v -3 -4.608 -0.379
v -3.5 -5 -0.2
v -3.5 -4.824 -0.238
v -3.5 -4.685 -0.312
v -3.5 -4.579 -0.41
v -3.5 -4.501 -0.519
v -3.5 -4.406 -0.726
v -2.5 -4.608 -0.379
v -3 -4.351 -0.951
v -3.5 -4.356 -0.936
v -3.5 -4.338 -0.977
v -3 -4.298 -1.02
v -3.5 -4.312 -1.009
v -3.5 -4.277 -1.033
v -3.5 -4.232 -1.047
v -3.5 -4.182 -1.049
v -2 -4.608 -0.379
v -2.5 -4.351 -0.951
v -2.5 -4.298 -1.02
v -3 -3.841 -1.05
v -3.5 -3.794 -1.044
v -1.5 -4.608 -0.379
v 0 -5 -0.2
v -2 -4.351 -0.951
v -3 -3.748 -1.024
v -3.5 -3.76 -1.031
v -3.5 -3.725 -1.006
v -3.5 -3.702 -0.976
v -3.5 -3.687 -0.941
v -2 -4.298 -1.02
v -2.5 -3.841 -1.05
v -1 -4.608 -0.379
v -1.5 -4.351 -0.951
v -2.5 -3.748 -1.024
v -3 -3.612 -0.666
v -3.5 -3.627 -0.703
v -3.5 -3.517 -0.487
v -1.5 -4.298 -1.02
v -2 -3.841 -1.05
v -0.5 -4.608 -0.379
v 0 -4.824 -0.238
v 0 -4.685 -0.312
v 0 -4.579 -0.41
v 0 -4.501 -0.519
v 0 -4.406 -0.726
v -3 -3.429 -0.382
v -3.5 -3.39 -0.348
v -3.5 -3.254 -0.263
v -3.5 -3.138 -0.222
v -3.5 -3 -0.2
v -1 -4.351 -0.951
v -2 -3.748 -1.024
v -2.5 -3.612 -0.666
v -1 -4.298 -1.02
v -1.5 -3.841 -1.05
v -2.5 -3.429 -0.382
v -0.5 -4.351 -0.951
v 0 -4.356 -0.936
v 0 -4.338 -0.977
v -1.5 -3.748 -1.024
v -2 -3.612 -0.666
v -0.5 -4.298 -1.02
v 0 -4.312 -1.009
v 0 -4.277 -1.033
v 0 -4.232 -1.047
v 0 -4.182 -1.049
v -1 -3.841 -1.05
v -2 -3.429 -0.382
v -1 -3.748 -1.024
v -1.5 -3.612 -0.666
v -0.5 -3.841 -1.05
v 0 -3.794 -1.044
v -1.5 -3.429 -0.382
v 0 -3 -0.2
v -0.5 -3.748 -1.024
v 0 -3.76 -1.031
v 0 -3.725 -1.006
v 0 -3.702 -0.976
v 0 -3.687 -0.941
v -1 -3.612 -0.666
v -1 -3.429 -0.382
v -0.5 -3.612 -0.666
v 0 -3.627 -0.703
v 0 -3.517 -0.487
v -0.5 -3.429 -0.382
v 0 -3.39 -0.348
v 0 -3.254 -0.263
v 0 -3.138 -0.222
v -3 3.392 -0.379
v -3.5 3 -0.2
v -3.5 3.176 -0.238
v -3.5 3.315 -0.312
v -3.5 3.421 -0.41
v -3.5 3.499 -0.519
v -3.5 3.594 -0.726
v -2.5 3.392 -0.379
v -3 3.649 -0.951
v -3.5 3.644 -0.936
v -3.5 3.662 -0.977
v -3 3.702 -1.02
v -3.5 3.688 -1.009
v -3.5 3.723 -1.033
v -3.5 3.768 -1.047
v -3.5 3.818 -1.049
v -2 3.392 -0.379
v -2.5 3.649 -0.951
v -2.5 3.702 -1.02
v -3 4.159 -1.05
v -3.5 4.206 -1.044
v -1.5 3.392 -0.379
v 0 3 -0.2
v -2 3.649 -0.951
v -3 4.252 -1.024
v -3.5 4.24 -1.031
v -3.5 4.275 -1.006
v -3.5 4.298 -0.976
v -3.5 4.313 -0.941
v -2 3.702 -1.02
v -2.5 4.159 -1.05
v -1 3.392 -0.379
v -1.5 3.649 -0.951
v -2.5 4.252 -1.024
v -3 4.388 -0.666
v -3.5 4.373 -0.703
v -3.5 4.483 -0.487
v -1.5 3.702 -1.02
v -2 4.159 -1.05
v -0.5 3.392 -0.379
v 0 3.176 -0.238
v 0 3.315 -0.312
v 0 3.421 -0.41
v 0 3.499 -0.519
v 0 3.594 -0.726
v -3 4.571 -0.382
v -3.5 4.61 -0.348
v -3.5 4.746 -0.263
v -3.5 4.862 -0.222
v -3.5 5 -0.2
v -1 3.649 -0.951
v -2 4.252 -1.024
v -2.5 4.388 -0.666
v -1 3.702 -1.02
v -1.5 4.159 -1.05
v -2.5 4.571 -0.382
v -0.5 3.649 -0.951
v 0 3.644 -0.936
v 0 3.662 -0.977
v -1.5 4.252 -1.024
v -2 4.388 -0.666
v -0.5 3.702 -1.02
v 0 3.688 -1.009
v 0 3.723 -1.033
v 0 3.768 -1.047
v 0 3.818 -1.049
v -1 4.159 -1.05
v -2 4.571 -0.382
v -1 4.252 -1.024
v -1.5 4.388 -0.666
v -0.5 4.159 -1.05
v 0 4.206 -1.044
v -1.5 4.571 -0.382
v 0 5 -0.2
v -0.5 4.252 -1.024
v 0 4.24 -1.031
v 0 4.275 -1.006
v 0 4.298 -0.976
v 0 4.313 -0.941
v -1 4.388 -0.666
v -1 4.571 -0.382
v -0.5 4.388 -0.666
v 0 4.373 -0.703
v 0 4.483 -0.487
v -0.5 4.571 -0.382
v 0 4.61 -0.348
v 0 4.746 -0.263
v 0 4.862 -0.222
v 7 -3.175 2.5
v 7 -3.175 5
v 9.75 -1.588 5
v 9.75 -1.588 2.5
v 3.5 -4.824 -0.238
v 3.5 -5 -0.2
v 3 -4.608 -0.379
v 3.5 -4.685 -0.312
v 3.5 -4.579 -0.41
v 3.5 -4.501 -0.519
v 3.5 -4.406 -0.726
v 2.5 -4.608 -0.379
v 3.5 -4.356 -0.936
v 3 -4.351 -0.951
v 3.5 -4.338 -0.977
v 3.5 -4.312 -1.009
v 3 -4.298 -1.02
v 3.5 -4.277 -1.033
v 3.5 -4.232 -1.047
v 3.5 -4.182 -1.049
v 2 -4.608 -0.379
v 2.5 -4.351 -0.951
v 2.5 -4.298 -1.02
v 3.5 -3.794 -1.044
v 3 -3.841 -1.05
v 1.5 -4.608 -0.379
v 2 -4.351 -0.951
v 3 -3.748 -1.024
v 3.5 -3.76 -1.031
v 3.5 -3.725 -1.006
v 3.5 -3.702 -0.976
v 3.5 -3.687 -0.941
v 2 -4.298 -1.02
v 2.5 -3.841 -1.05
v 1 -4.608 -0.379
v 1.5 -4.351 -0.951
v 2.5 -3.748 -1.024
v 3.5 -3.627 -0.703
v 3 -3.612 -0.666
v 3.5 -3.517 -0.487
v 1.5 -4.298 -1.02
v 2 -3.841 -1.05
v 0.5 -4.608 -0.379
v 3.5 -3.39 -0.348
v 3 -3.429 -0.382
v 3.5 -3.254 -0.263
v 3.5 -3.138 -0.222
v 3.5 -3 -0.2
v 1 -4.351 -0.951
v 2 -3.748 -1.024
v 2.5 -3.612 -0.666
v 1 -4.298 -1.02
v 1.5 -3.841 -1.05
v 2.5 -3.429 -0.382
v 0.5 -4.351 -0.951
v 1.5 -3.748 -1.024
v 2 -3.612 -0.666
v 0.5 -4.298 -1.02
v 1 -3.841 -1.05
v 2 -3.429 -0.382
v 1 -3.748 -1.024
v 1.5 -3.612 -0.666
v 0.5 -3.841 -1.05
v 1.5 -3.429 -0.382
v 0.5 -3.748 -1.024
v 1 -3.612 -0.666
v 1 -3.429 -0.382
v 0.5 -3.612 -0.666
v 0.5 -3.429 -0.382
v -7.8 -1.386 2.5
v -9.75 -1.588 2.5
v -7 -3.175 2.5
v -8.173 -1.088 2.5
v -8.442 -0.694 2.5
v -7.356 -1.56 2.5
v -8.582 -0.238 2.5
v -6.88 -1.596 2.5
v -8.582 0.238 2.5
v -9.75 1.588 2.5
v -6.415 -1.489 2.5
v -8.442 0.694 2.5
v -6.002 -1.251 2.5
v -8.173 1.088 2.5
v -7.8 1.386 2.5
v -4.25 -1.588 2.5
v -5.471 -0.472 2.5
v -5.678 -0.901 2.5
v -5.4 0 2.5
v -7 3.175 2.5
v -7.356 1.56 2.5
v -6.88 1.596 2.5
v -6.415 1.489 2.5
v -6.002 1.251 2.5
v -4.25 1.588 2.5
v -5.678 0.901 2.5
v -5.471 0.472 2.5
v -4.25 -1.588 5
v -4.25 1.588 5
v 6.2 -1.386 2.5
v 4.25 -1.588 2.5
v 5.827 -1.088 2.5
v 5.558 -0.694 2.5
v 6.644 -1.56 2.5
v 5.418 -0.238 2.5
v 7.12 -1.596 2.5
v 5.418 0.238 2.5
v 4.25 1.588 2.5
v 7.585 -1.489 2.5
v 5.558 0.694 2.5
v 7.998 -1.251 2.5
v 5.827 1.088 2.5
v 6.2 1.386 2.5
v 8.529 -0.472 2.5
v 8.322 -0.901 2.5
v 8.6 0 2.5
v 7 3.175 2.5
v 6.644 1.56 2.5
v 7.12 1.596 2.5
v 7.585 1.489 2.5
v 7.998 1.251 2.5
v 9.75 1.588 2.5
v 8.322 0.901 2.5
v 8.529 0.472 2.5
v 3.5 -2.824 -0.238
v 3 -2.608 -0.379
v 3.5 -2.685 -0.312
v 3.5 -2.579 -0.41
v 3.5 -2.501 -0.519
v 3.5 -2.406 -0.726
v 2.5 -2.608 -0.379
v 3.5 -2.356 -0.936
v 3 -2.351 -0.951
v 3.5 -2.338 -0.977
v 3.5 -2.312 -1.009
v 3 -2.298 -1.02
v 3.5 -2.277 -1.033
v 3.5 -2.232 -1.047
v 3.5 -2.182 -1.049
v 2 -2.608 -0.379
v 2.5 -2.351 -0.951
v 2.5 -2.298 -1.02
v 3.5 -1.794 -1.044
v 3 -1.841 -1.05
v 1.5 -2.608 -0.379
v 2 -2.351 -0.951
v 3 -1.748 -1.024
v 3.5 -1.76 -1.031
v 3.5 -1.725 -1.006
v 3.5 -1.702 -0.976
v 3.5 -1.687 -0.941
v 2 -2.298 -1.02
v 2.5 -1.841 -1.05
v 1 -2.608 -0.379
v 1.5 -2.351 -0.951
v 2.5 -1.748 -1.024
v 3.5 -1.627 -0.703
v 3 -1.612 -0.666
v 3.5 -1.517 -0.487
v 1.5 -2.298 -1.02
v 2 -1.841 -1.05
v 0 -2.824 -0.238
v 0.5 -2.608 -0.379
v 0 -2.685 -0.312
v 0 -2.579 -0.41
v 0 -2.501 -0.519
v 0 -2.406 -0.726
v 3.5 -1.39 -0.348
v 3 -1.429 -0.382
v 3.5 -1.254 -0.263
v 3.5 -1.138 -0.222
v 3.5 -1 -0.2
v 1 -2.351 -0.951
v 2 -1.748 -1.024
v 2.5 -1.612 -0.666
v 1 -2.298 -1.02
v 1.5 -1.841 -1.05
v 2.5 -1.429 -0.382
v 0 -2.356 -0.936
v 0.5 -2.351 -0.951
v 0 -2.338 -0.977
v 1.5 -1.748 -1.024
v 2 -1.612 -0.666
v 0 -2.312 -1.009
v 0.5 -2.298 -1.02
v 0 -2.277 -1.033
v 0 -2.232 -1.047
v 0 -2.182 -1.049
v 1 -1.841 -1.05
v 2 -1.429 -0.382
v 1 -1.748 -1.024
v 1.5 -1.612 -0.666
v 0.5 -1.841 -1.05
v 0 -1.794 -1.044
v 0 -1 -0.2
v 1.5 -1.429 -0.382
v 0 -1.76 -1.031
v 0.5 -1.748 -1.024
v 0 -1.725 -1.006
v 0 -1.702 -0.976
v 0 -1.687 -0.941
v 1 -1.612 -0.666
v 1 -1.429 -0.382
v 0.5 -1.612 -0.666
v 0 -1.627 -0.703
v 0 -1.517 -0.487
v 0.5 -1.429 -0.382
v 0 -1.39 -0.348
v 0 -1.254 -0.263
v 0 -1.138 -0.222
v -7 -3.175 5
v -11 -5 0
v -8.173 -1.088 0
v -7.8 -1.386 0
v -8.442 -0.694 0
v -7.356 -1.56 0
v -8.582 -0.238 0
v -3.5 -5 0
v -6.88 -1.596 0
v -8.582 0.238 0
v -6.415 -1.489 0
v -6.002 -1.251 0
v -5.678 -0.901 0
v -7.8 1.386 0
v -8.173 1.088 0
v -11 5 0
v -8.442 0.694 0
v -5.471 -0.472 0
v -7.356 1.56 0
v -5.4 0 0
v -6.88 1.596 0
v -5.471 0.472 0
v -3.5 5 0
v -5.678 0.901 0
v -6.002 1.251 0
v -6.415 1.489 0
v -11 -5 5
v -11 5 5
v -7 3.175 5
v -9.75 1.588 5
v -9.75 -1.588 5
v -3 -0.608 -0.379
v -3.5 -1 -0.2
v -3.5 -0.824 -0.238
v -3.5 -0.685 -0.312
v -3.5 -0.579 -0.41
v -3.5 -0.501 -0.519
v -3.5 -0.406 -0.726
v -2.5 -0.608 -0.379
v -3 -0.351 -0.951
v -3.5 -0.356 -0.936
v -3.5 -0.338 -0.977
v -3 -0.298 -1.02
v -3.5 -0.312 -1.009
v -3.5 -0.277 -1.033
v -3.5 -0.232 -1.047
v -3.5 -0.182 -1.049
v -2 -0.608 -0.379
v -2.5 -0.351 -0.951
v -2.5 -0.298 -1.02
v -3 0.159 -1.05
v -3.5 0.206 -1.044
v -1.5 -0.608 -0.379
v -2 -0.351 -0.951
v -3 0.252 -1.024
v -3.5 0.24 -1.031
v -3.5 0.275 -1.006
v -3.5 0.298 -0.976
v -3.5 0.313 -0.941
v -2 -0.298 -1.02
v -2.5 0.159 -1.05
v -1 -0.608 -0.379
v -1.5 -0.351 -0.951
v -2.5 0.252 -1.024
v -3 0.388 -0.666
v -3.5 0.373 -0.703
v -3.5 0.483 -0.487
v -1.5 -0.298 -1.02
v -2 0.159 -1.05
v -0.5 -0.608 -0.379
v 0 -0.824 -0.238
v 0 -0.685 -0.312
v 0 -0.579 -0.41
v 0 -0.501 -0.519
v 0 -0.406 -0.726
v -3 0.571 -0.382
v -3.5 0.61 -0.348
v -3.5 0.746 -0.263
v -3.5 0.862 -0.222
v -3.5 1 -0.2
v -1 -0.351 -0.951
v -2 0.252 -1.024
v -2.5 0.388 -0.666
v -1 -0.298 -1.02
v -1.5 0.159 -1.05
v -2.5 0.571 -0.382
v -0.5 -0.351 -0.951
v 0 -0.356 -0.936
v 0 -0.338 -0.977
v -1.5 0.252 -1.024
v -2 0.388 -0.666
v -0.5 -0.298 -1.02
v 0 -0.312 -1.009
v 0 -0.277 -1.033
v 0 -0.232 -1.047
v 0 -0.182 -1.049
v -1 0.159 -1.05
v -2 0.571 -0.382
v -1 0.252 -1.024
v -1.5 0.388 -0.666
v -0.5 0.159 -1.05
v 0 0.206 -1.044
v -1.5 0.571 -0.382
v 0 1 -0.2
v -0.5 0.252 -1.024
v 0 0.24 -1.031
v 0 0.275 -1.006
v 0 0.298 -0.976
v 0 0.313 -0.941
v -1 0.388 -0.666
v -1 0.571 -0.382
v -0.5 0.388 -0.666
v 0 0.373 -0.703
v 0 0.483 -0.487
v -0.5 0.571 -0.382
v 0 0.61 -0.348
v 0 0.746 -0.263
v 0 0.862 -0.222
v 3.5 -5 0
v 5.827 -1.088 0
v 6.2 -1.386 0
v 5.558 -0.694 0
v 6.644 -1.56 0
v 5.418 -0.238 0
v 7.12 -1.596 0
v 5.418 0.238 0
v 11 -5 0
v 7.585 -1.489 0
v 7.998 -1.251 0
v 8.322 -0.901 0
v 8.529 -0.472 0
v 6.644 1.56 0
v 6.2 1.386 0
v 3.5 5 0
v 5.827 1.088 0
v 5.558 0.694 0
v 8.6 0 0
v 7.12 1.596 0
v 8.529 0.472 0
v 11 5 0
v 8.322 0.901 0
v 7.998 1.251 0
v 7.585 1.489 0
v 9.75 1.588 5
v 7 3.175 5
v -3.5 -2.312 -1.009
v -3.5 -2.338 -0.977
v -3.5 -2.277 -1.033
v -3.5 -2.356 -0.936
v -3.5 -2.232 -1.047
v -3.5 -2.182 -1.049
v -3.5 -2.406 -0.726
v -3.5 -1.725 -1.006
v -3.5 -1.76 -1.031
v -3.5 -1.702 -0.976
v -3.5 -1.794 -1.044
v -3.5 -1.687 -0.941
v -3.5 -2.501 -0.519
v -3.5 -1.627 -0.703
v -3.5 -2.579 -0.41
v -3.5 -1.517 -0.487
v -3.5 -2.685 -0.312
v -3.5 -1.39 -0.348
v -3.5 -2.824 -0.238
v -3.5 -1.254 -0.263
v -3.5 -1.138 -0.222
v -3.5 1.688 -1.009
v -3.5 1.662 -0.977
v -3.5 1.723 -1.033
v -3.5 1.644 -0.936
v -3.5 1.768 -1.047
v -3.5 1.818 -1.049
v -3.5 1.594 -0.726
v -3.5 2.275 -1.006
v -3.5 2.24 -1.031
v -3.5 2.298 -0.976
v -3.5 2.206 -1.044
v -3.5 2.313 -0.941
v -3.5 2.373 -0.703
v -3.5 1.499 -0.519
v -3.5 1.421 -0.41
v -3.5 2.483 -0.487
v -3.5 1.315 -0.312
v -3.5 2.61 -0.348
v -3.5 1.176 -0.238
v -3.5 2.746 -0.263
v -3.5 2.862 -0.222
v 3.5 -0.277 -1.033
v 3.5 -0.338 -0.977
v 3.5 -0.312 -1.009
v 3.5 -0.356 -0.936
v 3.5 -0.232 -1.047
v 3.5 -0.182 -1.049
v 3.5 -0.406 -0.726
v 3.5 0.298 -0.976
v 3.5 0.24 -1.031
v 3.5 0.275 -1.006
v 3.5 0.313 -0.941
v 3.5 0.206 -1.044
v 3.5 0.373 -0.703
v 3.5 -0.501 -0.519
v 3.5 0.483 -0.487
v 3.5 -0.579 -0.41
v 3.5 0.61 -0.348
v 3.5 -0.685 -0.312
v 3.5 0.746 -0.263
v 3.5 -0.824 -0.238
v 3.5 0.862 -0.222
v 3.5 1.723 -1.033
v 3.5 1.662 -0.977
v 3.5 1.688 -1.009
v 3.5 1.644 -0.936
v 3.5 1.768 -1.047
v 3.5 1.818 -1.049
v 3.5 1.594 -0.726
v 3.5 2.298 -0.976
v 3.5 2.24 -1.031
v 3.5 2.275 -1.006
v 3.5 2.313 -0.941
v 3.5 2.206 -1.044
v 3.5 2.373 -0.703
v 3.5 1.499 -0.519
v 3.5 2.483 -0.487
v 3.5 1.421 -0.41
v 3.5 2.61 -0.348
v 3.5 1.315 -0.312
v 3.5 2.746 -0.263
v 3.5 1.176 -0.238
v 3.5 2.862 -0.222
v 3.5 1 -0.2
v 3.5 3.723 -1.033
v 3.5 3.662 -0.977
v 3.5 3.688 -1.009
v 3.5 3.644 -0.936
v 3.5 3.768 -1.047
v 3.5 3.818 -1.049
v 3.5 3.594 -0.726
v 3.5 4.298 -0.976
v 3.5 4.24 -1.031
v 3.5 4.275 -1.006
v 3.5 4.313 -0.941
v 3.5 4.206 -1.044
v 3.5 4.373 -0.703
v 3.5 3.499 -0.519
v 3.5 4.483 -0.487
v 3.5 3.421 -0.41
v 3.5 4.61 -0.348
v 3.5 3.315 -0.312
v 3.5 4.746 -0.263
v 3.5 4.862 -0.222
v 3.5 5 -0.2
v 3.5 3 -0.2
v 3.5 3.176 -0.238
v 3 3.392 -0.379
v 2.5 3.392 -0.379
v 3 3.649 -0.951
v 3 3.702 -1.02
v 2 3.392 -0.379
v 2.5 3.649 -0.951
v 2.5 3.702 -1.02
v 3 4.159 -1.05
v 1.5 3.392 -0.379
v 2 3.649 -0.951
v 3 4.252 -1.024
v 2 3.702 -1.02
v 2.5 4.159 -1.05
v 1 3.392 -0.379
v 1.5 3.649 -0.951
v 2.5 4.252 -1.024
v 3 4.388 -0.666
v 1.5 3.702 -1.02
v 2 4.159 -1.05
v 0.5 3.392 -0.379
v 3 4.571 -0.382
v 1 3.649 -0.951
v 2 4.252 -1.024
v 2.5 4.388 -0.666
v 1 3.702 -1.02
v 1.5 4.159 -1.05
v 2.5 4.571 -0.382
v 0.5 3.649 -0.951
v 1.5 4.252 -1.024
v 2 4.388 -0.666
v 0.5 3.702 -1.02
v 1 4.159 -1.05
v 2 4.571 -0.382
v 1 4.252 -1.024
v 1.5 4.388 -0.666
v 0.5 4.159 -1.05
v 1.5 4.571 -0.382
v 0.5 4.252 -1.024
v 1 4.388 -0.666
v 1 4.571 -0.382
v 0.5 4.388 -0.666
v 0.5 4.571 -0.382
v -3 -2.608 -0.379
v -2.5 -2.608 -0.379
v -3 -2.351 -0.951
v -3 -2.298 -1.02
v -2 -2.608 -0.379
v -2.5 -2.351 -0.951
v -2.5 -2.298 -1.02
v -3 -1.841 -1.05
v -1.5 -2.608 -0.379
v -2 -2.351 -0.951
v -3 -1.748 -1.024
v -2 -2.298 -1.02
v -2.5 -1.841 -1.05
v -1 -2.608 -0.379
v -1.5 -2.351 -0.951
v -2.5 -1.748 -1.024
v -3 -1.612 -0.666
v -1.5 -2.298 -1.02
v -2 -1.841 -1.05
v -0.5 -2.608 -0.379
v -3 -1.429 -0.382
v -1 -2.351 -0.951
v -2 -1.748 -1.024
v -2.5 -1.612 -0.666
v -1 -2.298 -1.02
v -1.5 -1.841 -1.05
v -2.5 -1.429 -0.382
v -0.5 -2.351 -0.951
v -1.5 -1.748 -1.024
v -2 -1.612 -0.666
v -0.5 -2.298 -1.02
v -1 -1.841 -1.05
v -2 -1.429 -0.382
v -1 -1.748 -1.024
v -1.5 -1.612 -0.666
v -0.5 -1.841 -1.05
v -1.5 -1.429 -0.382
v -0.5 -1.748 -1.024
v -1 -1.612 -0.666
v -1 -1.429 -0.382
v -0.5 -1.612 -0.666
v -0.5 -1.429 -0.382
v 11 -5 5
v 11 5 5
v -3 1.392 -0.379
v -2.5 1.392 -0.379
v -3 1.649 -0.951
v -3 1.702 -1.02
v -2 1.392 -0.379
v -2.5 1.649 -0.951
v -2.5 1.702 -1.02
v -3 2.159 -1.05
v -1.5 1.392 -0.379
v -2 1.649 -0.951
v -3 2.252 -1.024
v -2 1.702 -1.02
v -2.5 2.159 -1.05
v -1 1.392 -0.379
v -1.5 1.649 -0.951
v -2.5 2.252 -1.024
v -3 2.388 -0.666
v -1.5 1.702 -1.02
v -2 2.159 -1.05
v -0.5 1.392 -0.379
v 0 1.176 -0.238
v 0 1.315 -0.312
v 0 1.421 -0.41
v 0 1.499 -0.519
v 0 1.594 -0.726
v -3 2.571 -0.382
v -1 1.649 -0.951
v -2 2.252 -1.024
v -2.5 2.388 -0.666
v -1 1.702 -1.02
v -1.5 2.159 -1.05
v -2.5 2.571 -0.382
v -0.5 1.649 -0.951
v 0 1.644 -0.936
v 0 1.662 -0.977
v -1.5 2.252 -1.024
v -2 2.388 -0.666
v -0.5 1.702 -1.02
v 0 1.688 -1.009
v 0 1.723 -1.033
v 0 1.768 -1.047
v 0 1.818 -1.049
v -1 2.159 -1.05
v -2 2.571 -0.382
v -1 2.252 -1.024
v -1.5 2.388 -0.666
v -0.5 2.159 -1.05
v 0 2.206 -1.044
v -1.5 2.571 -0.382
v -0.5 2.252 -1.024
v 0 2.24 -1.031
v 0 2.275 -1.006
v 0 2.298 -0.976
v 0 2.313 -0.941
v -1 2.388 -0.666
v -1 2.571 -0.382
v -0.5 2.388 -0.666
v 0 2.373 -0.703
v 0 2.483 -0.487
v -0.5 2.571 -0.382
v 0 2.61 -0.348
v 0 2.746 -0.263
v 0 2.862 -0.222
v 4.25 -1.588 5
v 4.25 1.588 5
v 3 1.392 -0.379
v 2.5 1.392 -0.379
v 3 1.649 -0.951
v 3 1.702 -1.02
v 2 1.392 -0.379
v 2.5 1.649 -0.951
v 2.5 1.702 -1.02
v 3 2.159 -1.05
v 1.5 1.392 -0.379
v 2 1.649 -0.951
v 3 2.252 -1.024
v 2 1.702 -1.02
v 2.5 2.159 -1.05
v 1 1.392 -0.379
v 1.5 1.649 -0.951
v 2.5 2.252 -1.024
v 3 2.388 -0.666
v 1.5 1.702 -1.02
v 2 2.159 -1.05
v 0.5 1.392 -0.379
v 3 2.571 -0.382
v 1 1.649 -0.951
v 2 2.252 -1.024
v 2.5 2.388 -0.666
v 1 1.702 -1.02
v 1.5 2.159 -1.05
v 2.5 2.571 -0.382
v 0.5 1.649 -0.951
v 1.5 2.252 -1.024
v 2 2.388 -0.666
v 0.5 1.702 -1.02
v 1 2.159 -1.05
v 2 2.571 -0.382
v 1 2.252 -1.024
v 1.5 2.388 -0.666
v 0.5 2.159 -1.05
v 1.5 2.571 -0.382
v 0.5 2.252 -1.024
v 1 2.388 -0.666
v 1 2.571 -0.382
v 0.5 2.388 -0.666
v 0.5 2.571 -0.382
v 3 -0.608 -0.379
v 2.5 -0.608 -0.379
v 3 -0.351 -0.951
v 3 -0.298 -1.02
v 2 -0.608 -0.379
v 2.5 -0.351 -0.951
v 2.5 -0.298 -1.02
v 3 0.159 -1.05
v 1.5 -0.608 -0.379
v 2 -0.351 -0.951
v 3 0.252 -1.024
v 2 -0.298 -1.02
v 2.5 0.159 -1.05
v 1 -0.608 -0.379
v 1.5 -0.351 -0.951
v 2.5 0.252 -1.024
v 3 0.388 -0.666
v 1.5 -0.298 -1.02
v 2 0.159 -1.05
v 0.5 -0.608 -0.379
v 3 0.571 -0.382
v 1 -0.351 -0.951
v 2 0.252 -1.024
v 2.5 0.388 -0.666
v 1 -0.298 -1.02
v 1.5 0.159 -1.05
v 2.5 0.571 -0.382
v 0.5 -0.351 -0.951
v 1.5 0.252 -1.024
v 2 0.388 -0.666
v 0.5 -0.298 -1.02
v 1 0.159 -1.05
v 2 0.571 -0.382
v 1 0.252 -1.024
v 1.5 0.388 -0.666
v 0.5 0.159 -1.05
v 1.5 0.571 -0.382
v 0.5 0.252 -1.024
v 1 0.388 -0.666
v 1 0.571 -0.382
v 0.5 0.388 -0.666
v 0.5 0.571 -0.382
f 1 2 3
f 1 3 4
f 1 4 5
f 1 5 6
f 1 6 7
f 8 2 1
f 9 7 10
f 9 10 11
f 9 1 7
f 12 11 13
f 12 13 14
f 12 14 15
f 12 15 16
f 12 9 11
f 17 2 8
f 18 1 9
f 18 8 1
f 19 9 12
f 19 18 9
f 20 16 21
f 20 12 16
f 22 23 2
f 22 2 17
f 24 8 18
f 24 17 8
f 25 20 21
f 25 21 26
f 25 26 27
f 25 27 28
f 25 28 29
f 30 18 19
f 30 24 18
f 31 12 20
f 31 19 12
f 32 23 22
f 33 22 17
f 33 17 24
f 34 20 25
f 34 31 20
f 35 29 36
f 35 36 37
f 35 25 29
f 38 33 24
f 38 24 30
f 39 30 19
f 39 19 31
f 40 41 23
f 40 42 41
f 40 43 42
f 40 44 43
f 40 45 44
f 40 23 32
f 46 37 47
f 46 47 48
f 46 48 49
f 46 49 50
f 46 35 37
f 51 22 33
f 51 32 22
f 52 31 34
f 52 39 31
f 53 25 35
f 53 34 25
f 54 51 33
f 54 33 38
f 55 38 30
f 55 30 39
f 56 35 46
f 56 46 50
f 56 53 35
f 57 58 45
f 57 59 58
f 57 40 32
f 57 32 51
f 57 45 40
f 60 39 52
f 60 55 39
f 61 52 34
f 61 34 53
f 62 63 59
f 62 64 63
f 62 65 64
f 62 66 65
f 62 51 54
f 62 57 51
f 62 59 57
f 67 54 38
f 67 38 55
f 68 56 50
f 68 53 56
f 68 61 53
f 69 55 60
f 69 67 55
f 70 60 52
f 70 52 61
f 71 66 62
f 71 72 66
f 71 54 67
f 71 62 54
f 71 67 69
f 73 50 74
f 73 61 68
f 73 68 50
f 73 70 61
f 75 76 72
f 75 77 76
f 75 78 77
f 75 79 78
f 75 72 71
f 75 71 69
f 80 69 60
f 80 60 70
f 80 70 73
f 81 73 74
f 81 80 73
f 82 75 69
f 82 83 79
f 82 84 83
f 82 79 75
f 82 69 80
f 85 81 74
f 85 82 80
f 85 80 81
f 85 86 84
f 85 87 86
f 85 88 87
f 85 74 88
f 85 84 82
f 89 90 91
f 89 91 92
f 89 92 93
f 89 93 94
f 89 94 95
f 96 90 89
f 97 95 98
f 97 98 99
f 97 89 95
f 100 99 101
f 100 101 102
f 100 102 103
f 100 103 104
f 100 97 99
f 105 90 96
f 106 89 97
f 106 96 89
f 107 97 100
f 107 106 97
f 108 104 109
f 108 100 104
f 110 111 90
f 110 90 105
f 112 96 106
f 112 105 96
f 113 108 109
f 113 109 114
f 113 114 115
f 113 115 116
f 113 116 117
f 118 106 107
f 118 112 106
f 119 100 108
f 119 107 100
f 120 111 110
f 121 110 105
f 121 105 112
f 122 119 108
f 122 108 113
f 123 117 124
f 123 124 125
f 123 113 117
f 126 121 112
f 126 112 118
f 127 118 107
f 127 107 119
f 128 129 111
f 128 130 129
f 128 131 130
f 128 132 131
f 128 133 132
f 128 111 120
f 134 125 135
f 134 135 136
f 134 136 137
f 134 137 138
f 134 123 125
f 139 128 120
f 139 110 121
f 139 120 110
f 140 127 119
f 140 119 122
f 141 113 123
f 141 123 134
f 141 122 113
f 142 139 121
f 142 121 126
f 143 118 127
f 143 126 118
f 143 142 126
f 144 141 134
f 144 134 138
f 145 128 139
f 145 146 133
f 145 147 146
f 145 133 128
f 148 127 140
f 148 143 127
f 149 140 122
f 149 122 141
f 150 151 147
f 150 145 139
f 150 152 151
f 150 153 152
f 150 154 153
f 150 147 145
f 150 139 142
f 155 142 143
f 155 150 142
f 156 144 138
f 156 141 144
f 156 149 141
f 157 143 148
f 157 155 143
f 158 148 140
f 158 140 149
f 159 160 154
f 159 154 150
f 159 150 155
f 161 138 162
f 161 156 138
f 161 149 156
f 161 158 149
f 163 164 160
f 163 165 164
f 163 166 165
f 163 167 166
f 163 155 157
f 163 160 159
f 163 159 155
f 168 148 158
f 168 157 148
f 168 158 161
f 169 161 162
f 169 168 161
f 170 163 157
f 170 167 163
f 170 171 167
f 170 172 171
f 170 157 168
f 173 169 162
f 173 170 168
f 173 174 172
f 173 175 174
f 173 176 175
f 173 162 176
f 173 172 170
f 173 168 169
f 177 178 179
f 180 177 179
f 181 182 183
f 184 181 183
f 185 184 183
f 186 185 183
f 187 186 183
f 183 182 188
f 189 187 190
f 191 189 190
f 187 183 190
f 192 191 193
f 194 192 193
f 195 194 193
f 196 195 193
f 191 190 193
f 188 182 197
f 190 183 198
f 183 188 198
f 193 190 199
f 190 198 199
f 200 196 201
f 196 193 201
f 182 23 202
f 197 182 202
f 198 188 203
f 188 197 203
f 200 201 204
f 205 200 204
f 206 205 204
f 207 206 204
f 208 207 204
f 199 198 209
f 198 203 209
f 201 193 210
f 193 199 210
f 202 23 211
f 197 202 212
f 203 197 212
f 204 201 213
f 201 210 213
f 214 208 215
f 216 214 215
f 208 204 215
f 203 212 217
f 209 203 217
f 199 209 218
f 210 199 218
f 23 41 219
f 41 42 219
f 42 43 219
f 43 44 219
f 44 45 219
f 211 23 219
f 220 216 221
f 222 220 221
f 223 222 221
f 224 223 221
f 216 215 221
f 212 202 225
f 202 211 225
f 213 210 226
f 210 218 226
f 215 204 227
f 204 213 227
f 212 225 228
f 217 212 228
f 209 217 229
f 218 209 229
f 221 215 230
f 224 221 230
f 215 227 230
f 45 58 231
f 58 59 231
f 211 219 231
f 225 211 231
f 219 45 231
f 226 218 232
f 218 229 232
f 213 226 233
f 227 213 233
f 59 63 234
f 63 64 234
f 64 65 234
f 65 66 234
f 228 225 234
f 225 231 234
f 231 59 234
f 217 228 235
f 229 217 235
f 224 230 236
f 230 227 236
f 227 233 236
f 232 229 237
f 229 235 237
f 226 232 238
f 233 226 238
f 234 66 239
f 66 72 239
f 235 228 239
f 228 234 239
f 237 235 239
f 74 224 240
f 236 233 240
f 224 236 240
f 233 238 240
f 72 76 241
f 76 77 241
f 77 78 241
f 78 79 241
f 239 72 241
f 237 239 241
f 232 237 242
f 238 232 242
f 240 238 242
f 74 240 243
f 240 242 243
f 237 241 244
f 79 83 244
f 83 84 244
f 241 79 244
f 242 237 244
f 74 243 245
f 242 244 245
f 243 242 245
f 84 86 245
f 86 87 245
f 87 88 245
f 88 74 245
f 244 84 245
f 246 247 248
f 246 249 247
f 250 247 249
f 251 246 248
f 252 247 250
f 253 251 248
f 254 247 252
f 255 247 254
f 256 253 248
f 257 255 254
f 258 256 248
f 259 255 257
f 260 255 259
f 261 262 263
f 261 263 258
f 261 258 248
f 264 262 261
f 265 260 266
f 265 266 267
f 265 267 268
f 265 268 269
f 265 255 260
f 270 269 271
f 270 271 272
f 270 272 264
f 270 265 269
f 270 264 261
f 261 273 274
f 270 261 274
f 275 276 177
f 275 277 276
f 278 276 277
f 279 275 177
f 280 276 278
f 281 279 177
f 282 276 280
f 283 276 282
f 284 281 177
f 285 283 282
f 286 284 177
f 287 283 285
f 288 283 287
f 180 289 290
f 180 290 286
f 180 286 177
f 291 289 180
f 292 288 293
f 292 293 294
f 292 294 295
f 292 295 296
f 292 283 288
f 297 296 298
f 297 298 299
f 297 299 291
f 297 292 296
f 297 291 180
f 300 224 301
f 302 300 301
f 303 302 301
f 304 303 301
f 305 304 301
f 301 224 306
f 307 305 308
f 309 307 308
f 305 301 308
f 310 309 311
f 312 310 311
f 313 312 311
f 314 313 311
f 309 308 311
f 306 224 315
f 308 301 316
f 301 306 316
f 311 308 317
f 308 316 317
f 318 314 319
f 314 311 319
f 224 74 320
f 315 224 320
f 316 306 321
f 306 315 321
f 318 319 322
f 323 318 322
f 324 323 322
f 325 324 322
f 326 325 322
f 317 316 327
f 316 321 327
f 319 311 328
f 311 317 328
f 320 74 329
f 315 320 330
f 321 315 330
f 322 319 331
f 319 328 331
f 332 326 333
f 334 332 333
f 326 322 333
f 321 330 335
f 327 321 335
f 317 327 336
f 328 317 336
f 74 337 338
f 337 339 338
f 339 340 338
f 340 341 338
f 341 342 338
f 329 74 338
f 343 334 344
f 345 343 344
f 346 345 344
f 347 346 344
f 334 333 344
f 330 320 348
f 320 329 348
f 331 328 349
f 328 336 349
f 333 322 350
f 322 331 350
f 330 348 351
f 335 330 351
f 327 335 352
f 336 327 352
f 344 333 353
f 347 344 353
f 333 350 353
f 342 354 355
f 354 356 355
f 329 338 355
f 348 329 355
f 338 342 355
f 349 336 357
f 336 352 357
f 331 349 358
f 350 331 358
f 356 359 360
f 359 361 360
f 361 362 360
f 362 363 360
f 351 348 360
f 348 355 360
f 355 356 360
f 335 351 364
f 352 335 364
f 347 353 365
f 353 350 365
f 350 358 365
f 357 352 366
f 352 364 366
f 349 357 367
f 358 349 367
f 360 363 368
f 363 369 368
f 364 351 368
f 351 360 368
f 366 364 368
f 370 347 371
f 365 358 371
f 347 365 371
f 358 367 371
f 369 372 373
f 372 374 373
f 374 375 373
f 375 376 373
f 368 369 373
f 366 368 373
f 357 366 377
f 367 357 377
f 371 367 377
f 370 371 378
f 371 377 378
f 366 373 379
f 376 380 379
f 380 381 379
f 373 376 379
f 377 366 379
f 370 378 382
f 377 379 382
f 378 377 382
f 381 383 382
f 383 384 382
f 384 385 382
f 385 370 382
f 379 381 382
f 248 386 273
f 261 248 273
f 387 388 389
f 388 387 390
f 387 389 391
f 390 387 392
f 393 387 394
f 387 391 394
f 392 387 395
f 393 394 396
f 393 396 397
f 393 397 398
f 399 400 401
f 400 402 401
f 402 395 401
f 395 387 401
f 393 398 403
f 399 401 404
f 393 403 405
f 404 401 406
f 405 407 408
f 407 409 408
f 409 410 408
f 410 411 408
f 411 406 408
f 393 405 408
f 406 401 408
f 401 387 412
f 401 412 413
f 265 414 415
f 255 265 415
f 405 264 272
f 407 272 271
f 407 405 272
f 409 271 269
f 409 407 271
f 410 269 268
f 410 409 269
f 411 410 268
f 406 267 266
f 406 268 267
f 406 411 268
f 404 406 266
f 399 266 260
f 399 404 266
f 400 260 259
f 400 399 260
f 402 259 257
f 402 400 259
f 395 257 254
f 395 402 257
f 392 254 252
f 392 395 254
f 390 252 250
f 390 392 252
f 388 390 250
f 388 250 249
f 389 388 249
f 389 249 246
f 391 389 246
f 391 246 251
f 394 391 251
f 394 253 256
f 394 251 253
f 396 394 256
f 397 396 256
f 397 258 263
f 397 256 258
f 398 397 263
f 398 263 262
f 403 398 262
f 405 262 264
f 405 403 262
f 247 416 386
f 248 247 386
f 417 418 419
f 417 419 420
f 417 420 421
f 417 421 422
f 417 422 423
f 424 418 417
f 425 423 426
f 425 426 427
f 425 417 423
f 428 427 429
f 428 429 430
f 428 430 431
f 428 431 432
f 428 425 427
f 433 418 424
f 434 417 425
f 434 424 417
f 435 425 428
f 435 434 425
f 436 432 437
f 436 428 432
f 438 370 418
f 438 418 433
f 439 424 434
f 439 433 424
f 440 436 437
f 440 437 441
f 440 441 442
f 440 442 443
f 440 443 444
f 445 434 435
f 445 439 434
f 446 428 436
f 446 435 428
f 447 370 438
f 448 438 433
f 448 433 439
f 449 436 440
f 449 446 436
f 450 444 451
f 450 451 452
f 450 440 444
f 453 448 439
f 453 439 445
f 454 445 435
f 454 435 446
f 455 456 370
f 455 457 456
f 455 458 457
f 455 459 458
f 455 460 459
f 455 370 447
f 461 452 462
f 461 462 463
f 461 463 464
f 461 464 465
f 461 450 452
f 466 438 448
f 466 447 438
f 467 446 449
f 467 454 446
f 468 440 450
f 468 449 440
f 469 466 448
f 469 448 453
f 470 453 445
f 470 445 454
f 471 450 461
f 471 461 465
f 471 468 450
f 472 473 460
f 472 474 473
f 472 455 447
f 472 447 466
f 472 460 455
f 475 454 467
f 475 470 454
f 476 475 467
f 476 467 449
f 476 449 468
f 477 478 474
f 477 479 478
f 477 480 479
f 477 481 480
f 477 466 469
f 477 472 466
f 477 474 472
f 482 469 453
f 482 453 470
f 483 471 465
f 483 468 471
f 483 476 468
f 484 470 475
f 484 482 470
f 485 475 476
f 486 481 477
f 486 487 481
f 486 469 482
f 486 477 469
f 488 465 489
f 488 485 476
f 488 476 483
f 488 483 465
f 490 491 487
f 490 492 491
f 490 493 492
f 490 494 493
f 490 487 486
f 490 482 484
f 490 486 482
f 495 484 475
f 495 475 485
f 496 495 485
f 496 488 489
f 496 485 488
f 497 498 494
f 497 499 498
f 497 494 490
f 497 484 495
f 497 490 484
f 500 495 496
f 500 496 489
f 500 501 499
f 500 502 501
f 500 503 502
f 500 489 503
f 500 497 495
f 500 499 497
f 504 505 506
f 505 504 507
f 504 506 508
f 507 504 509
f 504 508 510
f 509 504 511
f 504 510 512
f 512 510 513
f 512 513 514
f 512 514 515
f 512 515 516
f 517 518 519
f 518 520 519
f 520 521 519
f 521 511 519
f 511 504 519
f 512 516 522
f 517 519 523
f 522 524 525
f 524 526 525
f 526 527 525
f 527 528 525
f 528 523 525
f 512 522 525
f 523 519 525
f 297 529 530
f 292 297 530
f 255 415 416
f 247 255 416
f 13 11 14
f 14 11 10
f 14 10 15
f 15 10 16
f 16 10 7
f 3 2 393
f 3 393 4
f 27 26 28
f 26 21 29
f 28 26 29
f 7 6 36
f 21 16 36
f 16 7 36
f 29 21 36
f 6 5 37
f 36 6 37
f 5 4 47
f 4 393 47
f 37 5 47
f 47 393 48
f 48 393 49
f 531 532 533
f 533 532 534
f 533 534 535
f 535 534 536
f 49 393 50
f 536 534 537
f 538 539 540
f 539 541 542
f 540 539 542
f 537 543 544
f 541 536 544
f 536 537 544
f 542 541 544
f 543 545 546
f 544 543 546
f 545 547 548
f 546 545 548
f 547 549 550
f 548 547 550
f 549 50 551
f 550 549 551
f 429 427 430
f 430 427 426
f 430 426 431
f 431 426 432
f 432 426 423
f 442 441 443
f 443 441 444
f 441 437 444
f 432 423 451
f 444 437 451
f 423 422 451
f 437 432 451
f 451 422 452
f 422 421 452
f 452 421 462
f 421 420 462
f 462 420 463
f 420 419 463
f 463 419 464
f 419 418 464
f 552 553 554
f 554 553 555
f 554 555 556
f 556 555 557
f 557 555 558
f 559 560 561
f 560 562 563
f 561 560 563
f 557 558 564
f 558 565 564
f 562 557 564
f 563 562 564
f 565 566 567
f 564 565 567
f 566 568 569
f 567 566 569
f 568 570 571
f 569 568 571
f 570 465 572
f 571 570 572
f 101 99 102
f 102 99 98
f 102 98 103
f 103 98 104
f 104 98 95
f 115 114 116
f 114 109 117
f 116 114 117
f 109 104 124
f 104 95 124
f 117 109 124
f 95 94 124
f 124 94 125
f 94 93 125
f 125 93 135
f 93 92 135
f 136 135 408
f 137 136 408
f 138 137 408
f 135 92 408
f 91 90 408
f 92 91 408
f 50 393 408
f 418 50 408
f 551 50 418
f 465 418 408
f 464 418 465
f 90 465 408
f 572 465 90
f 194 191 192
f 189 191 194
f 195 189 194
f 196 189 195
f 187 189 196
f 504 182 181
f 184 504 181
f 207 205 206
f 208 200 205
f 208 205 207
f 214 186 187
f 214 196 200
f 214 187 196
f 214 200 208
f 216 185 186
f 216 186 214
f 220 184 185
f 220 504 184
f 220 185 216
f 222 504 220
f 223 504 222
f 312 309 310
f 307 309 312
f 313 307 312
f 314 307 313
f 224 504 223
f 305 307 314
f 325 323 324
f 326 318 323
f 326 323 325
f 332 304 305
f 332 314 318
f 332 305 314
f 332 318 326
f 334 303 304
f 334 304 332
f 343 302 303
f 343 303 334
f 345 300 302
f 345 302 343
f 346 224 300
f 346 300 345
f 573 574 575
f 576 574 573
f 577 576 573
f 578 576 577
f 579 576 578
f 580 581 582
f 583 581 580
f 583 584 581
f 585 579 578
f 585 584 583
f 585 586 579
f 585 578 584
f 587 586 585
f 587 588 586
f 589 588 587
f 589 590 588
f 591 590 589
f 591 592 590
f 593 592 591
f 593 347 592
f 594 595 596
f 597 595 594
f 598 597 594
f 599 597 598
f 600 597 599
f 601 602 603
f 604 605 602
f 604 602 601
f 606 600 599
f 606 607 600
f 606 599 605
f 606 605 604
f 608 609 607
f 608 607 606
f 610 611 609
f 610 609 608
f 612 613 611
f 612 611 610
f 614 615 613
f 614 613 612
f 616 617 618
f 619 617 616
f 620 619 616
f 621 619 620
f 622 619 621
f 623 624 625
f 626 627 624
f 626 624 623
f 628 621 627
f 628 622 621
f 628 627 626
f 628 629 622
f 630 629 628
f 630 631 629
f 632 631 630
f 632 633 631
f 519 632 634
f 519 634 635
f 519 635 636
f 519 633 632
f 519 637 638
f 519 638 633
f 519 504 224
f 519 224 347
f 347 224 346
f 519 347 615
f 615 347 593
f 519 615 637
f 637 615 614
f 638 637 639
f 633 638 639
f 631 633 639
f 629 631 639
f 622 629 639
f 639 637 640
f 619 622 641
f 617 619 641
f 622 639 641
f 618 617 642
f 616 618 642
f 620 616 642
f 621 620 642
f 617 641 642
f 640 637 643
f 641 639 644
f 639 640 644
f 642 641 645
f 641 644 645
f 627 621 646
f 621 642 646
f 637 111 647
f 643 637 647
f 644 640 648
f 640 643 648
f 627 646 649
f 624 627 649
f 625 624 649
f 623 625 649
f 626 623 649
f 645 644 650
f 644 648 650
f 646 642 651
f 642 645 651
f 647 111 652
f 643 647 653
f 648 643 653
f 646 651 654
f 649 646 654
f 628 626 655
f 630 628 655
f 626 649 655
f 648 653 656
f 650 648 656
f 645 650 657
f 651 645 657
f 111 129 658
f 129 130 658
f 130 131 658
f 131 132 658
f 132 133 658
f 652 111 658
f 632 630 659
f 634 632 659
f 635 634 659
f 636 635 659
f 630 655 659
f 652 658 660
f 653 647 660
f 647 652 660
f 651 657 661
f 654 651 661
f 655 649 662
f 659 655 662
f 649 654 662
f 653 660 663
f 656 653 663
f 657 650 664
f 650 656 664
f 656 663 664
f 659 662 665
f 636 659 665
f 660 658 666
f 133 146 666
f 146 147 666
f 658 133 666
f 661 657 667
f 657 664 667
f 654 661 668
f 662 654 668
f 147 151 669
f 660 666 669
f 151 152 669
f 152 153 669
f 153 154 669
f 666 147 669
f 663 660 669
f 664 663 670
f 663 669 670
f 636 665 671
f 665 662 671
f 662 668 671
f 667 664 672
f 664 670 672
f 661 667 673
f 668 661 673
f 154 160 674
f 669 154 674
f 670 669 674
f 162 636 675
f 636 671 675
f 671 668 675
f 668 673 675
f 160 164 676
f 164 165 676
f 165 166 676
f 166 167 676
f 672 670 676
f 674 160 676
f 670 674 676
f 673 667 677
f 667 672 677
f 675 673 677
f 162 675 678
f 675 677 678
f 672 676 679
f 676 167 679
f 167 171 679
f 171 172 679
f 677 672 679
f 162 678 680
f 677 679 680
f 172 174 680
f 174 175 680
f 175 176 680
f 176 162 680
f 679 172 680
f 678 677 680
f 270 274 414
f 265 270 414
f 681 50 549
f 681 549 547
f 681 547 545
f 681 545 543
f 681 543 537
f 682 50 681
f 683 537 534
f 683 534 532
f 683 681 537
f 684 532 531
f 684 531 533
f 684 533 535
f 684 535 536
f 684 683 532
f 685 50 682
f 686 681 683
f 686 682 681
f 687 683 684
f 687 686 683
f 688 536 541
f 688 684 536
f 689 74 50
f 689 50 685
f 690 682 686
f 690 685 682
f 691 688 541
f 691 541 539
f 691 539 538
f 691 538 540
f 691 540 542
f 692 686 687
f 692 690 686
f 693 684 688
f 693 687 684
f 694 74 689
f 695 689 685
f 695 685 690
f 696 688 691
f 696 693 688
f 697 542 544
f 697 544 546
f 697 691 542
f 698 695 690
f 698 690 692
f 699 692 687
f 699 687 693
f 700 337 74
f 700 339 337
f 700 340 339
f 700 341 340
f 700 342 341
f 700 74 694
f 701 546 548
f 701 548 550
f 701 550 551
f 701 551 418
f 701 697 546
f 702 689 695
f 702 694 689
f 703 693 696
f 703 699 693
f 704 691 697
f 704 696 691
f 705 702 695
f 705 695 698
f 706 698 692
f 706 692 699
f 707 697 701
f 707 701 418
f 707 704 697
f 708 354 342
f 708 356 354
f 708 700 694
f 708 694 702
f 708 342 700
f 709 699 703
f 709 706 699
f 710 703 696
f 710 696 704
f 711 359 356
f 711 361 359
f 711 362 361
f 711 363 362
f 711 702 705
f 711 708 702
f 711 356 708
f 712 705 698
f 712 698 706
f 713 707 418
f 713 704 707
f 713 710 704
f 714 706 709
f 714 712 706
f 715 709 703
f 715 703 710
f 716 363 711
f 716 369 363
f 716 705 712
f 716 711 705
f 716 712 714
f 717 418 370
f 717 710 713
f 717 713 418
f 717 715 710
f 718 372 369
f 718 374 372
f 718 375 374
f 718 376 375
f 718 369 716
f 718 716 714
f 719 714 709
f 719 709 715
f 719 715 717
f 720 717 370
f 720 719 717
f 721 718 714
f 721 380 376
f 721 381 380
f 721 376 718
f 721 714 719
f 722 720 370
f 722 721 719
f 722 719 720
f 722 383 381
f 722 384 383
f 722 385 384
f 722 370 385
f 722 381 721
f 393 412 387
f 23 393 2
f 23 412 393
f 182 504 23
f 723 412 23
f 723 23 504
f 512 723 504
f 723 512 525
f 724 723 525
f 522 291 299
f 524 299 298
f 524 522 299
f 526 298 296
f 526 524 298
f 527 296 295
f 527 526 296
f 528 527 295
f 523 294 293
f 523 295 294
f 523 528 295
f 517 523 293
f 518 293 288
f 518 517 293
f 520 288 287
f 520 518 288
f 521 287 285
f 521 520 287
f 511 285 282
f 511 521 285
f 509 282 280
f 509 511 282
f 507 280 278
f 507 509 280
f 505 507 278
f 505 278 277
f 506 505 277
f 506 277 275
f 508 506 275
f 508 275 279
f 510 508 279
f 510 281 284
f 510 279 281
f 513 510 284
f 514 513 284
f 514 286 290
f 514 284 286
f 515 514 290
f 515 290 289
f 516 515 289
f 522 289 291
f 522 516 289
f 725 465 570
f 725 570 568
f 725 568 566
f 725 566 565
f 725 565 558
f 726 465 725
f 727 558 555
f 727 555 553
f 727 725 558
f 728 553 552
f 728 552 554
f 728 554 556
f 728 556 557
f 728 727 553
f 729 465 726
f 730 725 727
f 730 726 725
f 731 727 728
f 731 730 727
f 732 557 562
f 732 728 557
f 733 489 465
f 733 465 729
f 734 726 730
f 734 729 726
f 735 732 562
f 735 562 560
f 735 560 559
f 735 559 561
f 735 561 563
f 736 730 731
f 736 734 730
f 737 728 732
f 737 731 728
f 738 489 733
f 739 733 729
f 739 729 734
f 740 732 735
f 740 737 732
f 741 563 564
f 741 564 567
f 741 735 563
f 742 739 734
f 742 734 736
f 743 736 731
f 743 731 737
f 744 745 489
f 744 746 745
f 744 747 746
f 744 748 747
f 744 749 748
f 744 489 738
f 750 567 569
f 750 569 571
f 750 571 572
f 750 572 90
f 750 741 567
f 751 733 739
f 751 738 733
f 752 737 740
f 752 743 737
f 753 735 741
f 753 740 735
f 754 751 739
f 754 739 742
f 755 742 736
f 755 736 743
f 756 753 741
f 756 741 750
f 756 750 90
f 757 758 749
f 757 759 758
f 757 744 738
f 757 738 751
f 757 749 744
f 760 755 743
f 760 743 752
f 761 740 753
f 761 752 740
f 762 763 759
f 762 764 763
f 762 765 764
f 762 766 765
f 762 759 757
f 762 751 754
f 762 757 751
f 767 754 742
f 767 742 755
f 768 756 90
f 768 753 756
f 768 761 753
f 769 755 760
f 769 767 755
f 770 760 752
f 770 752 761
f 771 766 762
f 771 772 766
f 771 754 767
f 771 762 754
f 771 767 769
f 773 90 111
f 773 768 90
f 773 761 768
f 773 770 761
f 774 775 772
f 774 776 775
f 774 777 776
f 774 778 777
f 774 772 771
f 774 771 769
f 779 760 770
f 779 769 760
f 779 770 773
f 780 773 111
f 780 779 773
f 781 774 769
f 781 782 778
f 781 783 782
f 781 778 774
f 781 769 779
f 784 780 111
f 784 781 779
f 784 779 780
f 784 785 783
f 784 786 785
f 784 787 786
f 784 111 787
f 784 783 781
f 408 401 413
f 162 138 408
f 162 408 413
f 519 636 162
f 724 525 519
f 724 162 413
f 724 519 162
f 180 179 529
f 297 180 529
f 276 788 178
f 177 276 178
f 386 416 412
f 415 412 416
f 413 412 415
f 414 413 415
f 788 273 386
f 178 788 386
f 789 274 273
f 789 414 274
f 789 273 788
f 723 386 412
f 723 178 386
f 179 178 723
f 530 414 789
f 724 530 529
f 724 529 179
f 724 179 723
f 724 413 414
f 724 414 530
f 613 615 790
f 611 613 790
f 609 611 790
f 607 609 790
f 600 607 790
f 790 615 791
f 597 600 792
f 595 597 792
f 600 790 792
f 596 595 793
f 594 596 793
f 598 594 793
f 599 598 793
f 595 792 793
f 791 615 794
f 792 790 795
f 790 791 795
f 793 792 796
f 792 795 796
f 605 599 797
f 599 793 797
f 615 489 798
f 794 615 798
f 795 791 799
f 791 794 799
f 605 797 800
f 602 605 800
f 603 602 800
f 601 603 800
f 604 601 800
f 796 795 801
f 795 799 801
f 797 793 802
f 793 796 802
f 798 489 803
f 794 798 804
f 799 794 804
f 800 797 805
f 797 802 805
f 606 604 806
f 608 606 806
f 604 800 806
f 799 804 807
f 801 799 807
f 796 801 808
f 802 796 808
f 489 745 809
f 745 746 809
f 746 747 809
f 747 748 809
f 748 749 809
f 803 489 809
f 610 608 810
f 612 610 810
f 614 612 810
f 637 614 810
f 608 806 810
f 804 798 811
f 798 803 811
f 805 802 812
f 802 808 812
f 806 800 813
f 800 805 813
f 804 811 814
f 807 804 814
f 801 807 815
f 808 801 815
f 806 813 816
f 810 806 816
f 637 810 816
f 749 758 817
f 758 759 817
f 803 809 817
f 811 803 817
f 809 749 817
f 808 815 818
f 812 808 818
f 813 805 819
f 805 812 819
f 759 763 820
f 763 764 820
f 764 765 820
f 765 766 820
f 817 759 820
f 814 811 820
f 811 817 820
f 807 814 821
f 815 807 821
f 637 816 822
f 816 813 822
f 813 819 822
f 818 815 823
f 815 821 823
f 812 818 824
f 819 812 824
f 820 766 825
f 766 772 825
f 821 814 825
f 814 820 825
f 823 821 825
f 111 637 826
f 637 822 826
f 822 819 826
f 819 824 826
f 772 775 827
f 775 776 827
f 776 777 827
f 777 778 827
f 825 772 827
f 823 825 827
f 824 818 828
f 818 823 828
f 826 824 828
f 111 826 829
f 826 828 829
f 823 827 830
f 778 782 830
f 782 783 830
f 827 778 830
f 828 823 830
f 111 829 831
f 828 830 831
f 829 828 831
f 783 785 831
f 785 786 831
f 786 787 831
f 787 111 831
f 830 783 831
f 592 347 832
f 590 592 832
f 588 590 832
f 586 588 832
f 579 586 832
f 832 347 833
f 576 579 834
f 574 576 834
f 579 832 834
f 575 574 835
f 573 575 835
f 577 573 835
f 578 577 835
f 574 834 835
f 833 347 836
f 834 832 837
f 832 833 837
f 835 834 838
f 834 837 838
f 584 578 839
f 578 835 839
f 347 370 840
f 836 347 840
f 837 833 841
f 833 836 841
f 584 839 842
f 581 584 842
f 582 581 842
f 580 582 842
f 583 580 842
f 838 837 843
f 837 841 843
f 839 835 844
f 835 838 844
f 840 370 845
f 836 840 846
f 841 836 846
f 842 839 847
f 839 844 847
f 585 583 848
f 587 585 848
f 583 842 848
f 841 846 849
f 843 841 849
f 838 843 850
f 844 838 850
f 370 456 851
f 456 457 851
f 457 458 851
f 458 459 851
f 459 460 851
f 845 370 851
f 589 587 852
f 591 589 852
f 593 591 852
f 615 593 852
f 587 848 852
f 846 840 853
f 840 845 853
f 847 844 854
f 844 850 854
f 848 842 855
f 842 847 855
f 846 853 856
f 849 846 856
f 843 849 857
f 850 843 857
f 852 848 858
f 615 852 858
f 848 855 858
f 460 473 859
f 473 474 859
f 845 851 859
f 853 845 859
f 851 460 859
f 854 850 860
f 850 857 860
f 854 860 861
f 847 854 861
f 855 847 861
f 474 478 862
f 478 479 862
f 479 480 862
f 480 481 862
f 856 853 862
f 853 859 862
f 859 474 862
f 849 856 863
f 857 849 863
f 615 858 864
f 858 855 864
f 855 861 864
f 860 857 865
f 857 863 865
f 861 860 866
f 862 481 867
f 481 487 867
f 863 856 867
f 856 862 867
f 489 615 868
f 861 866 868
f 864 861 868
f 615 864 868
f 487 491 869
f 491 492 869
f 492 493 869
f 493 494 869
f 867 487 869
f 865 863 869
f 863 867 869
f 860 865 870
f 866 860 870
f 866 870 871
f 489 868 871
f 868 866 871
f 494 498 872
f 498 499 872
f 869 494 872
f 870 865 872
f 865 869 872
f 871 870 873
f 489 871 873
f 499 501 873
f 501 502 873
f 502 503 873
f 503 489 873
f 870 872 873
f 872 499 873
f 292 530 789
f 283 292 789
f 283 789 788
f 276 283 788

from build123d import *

# Parameters (mm, degrees)
SKETCH_W        = 22
SKETCH_H        = 10
PAD_DEPTH       = 5
PAD001_DEPTH    = 3.5
SKETCH009_R     = 1.6
POCKET_DEPTH    = 5.001
POCKET001_DEPTH = 2.5


with BuildPart() as part:
    # Sketch → Pad (new body)
    with BuildSketch(Plane.XY):
        Rectangle(SKETCH_W, SKETCH_H)
    extrude(amount=PAD_DEPTH)

    # Sketch008 (on DatumPlane) → Pad001 (join, symmetric)
    with BuildSketch(Plane(origin=(0, -5, -0.2), x_dir=(0, 1, 0), z_dir=(1, 0, 0))):
        with BuildLine():
            add(Edge.make_bspline(
                [(0, 0), (0.35359, -0.026741), (0.649381, -0.565336), (0.617792, -0.761919), (0.721021, -0.848783), (0.871627, -0.848783), (1.086099, -0.848783), (1.231939, -0.850694), (1.339653, -0.771577), (1.309148, -0.564354), (1.603926, -0.032231), (2, 0)],
                knots=[0, 0, 0, 0, 0.142857, 0.285714, 0.428571, 0.428571, 0.571429, 0.571429, 0.714286, 0.857143, 1, 1, 1, 1], degree=3))
            add(Edge.make_bspline(
                [(2, 0), (2.35359, -0.026741), (2.649381, -0.565336), (2.617792, -0.761919), (2.721021, -0.848783), (2.871627, -0.848783), (3.086099, -0.848783), (3.231939, -0.850694), (3.339653, -0.771577), (3.309148, -0.564354), (3.603926, -0.032231), (4, 0)],
                knots=[0, 0, 0, 0, 0.142857, 0.285714, 0.428571, 0.428571, 0.571429, 0.571429, 0.714286, 0.857143, 1, 1, 1, 1], degree=3))
            add(Edge.make_bspline(
                [(4, 0), (4.35359, -0.026741), (4.649381, -0.565336), (4.617792, -0.761919), (4.721021, -0.848783), (4.871627, -0.848783), (5.086099, -0.848783), (5.231939, -0.850694), (5.339653, -0.771577), (5.309148, -0.564354), (5.603926, -0.032231), (6, 0)],
                knots=[0, 0, 0, 0, 0.142857, 0.285714, 0.428571, 0.428571, 0.571429, 0.571429, 0.714286, 0.857143, 1, 1, 1, 1], degree=3))
            add(Edge.make_bspline(
                [(6, 0), (6.35359, -0.026741), (6.649381, -0.565336), (6.617792, -0.761919), (6.721021, -0.848783), (6.871627, -0.848783), (7.086099, -0.848783), (7.231939, -0.850694), (7.339653, -0.771577), (7.309148, -0.564354), (7.603926, -0.032231), (8, 0)],
                knots=[0, 0, 0, 0, 0.142857, 0.285714, 0.428571, 0.428571, 0.571429, 0.571429, 0.714286, 0.857143, 1, 1, 1, 1], degree=3))
            add(Edge.make_bspline(
                [(8, 0), (8.35359, -0.026741), (8.649381, -0.565336), (8.617792, -0.761919), (8.721021, -0.848783), (8.871627, -0.848783), (9.086099, -0.848783), (9.231939, -0.850694), (9.339653, -0.771577), (9.309148, -0.564354), (9.603926, -0.032231), (10, 0)],
                knots=[0, 0, 0, 0, 0.142857, 0.285714, 0.428571, 0.428571, 0.571429, 0.571429, 0.714286, 0.857143, 1, 1, 1, 1], degree=3))
            Line((10, 0), (10, 0.958783))
            Line((10, 0.958783), (0, 0.958783))
            Line((0, 0.958783), (0, 0))
        make_face()
    extrude(amount=PAD001_DEPTH, both=True)

    # Sketch009 → Pocket (cut, through all)
    with BuildSketch(Plane.XY):
        with Locations((-7, 0)):
            Circle(SKETCH009_R)
        with Locations((7, 0)):
            Circle(SKETCH009_R)
    extrude(amount=POCKET_DEPTH, mode=Mode.SUBTRACT)

    # Sketch010 (on DatumPlane) → Pocket001 (cut)
    with BuildSketch(Plane.XY.offset(5)):
        Polygon((-4.25, -1.587713), (-4.25, 1.587713), (-7, 3.175426), (-9.75, 1.587713), (-9.75, -1.587713), (-7, -3.175426), align=None)
        Polygon((4.25, -1.587713), (7, -3.175426), (9.75, -1.587713), (9.75, 1.587713), (7, 3.175426), (4.25, 1.587713), align=None)
    extrude(amount=-POCKET001_DEPTH, mode=Mode.SUBTRACT)


solid = part.part
